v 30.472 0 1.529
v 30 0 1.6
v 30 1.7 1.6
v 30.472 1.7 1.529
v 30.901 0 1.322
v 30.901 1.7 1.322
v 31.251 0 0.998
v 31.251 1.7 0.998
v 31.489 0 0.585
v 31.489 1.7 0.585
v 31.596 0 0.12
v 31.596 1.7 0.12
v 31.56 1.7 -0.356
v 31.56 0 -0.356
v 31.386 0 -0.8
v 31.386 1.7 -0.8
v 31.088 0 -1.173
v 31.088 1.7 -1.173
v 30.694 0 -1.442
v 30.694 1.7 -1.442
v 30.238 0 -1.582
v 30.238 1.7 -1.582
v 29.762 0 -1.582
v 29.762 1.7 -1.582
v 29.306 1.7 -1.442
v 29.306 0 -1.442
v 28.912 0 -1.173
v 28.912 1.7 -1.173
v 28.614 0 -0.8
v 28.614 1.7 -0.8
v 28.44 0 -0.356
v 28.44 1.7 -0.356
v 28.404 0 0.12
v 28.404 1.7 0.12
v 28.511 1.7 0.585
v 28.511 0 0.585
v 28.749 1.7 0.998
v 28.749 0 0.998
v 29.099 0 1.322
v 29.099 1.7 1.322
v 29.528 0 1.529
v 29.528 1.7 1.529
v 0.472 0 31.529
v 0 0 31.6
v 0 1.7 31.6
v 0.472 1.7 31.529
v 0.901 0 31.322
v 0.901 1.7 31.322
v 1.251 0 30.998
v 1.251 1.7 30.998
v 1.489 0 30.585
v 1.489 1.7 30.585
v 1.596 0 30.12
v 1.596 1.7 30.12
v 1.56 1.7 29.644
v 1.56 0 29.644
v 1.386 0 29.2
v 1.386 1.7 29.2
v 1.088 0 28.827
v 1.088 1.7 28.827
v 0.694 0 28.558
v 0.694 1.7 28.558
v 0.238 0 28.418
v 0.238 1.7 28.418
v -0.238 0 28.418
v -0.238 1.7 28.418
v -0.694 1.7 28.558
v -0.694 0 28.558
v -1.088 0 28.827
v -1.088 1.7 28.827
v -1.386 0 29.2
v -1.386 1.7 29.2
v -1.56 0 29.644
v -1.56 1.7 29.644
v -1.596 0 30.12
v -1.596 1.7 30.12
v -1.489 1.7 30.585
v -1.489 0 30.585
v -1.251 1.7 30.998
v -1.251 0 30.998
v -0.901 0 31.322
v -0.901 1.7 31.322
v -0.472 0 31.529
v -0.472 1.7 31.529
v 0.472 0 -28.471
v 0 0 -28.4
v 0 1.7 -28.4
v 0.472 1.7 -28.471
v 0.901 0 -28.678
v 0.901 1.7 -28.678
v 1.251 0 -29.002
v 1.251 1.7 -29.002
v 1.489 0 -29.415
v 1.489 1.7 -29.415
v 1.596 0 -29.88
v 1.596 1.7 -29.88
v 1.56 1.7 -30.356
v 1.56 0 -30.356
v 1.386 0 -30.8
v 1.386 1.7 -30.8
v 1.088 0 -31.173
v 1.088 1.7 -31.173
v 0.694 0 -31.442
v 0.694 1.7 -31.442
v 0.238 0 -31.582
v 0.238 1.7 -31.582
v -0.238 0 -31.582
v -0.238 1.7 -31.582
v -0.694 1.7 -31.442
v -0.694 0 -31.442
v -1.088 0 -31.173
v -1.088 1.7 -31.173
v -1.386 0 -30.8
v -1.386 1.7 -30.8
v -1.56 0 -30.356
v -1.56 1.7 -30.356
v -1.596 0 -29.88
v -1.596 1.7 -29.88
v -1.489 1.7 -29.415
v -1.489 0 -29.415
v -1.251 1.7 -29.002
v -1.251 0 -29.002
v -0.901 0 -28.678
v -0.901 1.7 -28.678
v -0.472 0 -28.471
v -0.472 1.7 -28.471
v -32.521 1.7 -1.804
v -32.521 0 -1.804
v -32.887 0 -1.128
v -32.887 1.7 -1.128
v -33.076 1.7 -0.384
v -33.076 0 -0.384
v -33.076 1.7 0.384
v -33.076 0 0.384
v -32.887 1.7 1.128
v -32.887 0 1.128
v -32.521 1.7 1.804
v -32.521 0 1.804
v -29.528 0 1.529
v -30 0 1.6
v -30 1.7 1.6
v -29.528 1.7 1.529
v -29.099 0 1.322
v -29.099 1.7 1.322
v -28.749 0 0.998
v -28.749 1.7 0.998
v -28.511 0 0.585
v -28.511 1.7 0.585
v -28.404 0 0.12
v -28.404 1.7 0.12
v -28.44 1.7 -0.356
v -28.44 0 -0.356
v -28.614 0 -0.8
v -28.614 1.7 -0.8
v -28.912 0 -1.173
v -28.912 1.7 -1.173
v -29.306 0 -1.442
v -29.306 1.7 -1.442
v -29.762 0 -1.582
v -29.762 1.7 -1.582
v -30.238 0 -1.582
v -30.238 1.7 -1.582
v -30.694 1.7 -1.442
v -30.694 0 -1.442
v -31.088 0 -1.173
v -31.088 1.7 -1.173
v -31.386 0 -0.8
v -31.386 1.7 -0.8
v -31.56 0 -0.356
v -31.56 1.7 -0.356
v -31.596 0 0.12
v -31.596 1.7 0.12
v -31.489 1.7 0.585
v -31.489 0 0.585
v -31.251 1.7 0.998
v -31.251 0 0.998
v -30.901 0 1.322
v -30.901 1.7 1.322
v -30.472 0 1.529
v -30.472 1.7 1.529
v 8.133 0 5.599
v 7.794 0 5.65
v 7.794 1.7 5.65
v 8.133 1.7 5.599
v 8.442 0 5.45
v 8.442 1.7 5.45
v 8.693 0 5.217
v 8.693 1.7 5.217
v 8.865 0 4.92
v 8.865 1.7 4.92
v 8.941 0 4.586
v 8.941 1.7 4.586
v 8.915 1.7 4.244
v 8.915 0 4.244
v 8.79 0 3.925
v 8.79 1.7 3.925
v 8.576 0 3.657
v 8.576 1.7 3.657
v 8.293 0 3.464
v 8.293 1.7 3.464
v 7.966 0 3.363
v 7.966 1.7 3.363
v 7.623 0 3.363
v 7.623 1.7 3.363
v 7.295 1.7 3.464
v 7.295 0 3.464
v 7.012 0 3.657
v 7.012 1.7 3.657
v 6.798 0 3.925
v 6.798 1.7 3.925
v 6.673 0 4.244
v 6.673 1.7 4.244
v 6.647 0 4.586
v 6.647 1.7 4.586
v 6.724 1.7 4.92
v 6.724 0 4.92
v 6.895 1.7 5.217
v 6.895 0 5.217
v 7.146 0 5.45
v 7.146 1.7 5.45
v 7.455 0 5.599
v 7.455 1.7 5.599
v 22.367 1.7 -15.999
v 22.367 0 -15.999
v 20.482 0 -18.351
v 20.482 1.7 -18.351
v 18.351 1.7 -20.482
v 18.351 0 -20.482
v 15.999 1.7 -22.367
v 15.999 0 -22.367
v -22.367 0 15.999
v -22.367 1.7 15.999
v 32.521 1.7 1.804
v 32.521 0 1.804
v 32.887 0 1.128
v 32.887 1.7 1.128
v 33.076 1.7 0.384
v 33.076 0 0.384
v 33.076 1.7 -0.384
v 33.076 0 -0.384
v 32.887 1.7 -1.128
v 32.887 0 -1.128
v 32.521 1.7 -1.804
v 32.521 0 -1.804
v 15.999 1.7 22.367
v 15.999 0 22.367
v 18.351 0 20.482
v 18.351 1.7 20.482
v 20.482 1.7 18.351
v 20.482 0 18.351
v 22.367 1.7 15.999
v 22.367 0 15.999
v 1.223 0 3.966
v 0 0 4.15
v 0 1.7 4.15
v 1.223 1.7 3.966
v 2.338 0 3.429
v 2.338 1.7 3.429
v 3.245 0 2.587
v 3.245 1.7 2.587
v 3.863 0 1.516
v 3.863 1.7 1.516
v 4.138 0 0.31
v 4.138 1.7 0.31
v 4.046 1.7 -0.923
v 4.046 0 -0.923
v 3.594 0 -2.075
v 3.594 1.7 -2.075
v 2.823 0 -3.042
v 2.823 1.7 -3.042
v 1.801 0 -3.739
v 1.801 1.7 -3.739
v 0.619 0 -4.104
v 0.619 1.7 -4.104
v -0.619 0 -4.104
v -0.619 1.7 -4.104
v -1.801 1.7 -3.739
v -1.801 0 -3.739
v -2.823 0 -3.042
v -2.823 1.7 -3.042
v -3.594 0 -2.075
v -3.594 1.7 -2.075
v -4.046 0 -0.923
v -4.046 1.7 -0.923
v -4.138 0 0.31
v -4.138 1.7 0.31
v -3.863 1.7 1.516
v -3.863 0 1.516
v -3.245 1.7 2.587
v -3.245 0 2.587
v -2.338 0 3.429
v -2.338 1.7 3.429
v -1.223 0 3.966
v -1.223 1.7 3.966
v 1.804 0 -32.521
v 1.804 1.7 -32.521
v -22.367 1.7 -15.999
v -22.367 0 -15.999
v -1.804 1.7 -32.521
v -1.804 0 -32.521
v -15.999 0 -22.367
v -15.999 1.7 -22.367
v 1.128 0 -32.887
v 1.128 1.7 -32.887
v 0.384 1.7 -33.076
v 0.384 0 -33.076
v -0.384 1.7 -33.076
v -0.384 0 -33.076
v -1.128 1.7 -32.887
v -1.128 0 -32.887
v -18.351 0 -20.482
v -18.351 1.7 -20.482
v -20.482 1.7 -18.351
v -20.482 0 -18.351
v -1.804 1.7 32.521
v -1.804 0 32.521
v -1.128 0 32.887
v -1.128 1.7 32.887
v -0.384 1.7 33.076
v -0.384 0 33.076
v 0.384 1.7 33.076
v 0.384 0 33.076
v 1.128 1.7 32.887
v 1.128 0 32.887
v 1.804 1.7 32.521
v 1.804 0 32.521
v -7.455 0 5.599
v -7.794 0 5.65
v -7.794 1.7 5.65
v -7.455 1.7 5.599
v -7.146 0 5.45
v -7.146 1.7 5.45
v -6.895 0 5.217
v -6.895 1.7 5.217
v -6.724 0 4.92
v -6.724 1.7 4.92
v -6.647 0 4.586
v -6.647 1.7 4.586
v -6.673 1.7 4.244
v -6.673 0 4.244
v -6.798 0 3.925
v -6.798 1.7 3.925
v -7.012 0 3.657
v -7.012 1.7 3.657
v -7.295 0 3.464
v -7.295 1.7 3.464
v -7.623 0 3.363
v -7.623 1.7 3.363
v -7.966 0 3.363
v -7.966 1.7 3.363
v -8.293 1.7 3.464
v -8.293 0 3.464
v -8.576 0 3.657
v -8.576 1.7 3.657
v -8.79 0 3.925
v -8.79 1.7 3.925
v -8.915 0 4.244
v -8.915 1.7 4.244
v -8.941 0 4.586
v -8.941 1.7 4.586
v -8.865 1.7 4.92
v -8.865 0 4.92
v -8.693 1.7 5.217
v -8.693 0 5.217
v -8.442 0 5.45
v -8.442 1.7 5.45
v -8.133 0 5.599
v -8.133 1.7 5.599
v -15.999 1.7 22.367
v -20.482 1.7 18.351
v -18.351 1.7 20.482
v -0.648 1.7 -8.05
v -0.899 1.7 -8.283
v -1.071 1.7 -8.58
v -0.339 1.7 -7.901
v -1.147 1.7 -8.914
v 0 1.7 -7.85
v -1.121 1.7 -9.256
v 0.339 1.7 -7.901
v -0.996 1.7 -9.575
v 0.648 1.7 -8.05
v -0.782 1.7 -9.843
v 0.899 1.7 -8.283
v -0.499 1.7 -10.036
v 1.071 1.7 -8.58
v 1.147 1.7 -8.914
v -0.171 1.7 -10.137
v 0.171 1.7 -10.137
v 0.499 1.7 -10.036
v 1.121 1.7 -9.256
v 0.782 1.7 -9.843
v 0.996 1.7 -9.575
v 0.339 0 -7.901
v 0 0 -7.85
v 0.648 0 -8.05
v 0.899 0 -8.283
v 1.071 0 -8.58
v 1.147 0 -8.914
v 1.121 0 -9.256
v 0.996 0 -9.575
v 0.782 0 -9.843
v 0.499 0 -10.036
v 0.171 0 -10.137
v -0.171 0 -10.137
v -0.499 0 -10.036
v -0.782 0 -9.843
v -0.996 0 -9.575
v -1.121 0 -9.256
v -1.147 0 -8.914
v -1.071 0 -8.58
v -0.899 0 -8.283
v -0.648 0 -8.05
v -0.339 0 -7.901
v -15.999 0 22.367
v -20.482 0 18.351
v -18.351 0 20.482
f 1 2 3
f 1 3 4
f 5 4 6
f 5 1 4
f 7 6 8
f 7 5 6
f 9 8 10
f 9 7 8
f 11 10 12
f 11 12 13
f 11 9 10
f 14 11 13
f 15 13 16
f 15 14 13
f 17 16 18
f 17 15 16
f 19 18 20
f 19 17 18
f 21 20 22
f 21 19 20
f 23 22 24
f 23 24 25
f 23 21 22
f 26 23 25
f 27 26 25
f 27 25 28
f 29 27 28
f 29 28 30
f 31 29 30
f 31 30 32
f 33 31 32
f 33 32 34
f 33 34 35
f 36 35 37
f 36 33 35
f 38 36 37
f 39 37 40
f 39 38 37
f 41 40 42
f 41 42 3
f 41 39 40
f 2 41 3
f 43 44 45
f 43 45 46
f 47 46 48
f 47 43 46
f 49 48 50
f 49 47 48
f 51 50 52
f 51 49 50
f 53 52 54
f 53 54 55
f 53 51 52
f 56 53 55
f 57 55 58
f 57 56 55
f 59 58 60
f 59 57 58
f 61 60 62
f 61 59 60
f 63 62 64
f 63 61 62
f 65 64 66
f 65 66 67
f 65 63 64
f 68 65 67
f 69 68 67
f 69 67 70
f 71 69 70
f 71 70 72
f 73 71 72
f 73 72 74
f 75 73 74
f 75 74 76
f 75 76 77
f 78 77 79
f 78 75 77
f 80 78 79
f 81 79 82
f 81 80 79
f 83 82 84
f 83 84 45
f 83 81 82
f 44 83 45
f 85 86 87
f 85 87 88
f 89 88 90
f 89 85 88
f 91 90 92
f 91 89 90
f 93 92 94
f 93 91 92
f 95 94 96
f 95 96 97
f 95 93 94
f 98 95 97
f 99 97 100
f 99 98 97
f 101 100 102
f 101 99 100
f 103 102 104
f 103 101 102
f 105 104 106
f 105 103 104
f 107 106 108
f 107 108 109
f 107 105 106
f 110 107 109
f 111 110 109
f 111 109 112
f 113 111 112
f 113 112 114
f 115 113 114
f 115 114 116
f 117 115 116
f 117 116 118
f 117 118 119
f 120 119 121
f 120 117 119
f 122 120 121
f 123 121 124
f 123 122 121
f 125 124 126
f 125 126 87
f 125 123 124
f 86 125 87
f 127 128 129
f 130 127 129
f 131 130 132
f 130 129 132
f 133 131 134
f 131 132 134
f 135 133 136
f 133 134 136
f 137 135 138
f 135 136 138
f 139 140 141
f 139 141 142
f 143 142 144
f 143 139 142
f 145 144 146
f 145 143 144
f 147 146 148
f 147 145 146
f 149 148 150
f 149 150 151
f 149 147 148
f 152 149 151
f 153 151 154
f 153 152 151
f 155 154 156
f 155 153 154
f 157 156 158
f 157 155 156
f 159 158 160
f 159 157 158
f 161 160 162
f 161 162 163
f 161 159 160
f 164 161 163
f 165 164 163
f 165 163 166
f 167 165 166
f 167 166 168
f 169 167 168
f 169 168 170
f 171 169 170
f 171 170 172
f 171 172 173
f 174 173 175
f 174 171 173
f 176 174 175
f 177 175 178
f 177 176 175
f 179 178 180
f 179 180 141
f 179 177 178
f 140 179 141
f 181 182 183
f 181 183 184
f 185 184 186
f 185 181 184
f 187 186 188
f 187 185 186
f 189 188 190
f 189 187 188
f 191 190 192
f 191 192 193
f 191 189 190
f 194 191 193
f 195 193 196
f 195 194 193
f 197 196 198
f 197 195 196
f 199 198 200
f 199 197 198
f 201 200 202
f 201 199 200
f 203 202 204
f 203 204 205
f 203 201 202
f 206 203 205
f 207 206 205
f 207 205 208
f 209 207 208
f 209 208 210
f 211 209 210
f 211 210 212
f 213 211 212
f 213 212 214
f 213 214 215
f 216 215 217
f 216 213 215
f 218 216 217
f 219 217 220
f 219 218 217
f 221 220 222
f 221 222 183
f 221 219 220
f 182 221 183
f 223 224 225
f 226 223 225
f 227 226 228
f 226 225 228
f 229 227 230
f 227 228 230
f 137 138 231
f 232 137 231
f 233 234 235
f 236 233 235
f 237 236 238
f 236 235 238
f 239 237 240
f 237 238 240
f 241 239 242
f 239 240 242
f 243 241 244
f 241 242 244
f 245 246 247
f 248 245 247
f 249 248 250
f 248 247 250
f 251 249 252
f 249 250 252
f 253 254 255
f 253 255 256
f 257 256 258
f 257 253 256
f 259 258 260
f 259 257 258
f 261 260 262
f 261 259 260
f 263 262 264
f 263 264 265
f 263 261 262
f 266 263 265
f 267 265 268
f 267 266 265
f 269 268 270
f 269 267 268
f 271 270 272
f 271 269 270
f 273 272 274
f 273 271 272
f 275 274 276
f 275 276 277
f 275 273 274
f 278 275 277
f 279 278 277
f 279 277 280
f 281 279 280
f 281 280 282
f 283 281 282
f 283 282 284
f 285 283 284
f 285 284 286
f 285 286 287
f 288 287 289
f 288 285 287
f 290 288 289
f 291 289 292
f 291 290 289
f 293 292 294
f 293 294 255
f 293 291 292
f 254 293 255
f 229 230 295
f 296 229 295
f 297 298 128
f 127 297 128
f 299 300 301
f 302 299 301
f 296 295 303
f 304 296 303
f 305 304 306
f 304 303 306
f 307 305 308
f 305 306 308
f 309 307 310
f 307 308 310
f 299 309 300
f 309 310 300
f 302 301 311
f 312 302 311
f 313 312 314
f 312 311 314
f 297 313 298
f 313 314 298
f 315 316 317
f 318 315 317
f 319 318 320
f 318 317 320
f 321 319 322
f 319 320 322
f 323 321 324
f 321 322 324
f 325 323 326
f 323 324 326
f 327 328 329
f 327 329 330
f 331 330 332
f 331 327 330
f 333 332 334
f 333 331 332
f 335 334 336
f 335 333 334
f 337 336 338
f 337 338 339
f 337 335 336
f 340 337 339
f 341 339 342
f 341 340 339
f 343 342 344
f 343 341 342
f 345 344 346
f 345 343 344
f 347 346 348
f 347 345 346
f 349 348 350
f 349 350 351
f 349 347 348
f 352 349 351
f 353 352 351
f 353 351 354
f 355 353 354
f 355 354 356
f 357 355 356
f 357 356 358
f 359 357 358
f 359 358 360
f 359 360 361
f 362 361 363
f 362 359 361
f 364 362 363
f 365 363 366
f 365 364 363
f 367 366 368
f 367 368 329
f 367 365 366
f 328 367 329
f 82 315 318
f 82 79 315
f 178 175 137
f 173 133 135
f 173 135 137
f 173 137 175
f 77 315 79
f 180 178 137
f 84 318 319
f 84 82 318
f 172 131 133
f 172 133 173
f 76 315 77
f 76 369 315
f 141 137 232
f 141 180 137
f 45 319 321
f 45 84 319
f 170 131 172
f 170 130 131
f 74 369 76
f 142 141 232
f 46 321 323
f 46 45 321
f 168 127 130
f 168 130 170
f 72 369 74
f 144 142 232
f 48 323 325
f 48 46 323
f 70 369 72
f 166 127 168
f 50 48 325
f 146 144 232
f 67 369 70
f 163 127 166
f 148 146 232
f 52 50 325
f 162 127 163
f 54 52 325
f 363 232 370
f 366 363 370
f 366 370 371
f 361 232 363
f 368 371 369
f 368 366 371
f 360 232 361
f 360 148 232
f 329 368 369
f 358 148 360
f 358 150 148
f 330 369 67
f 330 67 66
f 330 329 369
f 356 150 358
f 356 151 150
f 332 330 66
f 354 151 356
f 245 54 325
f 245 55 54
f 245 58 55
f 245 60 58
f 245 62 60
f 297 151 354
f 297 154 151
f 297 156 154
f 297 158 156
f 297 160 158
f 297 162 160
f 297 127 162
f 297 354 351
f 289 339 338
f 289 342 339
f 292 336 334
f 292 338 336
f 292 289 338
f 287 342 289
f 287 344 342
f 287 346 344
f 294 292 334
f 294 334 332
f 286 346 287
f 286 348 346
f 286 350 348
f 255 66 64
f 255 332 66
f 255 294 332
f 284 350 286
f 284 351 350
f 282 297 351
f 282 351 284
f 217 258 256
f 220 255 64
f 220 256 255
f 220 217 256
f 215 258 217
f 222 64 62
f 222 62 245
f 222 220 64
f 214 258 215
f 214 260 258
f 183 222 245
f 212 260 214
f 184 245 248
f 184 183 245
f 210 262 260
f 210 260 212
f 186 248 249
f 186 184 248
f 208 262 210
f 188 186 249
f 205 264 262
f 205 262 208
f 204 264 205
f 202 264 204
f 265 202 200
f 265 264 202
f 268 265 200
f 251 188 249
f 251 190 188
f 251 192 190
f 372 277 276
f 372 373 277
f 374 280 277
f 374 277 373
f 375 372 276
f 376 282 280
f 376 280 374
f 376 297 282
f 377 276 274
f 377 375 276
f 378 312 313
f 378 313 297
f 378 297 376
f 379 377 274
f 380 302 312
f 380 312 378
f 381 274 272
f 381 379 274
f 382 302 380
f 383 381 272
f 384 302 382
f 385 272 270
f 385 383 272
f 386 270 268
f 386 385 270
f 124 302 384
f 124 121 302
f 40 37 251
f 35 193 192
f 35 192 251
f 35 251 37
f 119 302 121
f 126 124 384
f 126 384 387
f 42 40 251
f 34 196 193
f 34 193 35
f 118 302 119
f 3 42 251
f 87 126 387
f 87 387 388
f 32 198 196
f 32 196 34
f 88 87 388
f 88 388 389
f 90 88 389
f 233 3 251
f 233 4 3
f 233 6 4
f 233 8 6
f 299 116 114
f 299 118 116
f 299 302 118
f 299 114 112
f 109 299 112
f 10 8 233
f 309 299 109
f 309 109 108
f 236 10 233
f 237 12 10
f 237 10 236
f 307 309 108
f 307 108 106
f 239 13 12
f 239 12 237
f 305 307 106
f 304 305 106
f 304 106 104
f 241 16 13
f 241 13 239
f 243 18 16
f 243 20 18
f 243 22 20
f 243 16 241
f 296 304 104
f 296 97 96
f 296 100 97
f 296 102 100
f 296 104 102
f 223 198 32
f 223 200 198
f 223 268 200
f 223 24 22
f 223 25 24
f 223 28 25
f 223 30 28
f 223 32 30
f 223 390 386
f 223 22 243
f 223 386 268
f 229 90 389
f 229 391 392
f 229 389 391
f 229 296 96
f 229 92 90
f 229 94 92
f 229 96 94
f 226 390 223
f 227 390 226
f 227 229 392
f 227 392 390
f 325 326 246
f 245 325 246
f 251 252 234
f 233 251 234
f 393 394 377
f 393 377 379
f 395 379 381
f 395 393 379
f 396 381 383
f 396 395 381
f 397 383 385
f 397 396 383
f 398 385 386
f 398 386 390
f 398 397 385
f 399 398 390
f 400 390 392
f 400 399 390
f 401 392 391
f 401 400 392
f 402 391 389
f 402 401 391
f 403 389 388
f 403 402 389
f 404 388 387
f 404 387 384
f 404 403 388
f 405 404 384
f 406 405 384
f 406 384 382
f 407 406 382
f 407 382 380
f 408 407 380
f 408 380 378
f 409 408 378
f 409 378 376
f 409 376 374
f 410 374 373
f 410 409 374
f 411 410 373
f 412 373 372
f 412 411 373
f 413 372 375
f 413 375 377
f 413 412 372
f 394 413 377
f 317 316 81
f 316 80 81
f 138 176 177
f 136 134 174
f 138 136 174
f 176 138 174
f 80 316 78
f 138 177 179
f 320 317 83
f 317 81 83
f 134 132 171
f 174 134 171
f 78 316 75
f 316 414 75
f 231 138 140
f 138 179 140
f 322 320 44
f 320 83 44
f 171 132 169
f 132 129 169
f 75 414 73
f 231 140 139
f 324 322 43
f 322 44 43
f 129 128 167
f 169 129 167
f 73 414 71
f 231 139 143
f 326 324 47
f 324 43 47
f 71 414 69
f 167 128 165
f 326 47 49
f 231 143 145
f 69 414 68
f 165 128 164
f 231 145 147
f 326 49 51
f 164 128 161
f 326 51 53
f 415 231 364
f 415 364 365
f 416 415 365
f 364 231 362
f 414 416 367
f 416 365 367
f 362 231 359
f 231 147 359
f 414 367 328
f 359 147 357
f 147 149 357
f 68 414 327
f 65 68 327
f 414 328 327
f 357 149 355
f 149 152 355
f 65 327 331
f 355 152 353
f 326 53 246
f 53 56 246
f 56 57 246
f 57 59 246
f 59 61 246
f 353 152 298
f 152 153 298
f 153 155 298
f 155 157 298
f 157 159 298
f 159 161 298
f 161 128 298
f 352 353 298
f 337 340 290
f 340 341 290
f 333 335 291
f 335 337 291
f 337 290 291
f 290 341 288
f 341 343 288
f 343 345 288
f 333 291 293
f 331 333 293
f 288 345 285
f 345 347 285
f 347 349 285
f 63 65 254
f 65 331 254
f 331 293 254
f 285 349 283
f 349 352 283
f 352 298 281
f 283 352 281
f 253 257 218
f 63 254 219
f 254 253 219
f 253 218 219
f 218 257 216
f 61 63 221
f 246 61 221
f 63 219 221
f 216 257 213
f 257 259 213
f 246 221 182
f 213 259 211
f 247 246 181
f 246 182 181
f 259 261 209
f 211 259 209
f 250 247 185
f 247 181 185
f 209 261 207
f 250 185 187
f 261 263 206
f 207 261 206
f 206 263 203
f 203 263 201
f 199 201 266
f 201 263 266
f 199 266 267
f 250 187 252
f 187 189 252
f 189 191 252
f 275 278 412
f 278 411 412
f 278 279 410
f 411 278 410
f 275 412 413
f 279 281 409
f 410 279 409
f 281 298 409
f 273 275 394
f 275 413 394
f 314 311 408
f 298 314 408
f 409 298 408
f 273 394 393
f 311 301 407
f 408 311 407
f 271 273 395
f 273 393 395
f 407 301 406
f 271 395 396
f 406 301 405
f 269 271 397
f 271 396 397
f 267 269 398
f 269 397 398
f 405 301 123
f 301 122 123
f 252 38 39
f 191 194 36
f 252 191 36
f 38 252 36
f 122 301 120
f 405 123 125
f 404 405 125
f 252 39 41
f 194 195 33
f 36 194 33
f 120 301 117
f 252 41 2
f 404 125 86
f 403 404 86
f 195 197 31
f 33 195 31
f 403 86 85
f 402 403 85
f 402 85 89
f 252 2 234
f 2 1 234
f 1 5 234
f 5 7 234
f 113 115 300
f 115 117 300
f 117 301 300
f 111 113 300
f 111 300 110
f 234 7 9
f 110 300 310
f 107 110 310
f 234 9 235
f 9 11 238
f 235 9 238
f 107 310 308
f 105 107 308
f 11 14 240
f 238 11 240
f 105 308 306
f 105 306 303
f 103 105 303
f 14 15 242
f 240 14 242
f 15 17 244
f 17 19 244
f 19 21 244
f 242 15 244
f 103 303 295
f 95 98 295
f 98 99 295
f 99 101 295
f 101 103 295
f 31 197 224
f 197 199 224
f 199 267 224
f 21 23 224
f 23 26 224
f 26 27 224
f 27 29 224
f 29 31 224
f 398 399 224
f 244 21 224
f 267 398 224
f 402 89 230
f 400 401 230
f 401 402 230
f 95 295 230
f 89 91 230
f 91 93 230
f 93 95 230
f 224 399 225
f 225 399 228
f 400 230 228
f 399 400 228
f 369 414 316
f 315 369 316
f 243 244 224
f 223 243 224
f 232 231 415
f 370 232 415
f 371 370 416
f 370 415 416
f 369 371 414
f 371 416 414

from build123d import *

# Parameters (mm, degrees)
SKETCH1_R           = 1.6
SKETCH1_R_2         = 1.15
SKETCH1_R_3         = 4.15
BOSS_EXTRUDE2_DEPTH = 1.7


with BuildPart() as part:
    # Sketch1 → Boss-Extrude2 (new body)
    with BuildSketch(Plane(origin=(0, 0, 0), x_dir=(1, 0, 0), z_dir=(0, 1, 0))):
        with BuildLine():
            Line((1.803573736, -32.521333333), (15.999444435, -22.366666667))
            ThreePointArc((15.999444435, -22.366666667), (19.445436483, -19.445436483), (22.366666667, -15.999444435))
            Line((22.366666667, -15.999444435), (32.521333333, -1.803573736))
            ThreePointArc((32.521333333, -1.803573736), (33.1, 0), (32.521333333, 1.803573736))
            Line((32.521333333, 1.803573736), (22.366666667, 15.999444435))
            ThreePointArc((22.366666667, 15.999444435), (19.445436483, 19.445436483), (15.999444435, 22.366666667))
            Line((15.999444435, 22.366666667), (1.803573736, 32.521333333))
            ThreePointArc((1.803573736, 32.521333333), (0, 33.1), (-1.803573736, 32.521333333))
            Line((-1.803573736, 32.521333333), (-15.999444435, 22.366666667))
            ThreePointArc((-15.999444435, 22.366666667), (-19.445436483, 19.445436483), (-22.366666667, 15.999444435))
            Line((-22.366666667, 15.999444435), (-32.521333333, 1.803573736))
            ThreePointArc((-32.521333333, 1.803573736), (-33.1, 0), (-32.521333333, -1.803573736))
            Line((-32.521333333, -1.803573736), (-22.366666667, -15.999444435))
            ThreePointArc((-22.366666667, -15.999444435), (-19.445436483, -19.445436483), (-15.999444435, -22.366666667))
            Line((-15.999444435, -22.366666667), (-1.803573736, -32.521333333))
            ThreePointArc((-1.803573736, -32.521333333), (0, -33.1), (1.803573736, -32.521333333))
        make_face()
        with Locations(Location((0, -30, 0), (0, 0, 270))):
            Circle(SKETCH1_R, mode=Mode.SUBTRACT)
        with Locations(Location((0, 9, 0), (0, 0, 270))):
            Circle(SKETCH1_R_2, mode=Mode.SUBTRACT)
        with Locations(Location((-7.794228634, -4.5, 0), (0, 0, 270))):
            Circle(SKETCH1_R_2, mode=Mode.SUBTRACT)
        with Locations(Location((7.794228634, -4.5, 0), (0, 0, 270))):
            Circle(SKETCH1_R_2, mode=Mode.SUBTRACT)
        with Locations(Location((0, 0, 0), (0, 0, 270))):
            Circle(SKETCH1_R_3, mode=Mode.SUBTRACT)
        with Locations(Location((30, 0, 0), (0, 0, 270))):
            Circle(SKETCH1_R, mode=Mode.SUBTRACT)
        with Locations(Location((-30, 0, 0), (0, 0, 270))):
            Circle(SKETCH1_R, mode=Mode.SUBTRACT)
        with Locations(Location((0, 30, 0), (0, 0, 270))):
            Circle(SKETCH1_R, mode=Mode.SUBTRACT)
    extrude(amount=BOSS_EXTRUDE2_DEPTH)


solid = part.part
